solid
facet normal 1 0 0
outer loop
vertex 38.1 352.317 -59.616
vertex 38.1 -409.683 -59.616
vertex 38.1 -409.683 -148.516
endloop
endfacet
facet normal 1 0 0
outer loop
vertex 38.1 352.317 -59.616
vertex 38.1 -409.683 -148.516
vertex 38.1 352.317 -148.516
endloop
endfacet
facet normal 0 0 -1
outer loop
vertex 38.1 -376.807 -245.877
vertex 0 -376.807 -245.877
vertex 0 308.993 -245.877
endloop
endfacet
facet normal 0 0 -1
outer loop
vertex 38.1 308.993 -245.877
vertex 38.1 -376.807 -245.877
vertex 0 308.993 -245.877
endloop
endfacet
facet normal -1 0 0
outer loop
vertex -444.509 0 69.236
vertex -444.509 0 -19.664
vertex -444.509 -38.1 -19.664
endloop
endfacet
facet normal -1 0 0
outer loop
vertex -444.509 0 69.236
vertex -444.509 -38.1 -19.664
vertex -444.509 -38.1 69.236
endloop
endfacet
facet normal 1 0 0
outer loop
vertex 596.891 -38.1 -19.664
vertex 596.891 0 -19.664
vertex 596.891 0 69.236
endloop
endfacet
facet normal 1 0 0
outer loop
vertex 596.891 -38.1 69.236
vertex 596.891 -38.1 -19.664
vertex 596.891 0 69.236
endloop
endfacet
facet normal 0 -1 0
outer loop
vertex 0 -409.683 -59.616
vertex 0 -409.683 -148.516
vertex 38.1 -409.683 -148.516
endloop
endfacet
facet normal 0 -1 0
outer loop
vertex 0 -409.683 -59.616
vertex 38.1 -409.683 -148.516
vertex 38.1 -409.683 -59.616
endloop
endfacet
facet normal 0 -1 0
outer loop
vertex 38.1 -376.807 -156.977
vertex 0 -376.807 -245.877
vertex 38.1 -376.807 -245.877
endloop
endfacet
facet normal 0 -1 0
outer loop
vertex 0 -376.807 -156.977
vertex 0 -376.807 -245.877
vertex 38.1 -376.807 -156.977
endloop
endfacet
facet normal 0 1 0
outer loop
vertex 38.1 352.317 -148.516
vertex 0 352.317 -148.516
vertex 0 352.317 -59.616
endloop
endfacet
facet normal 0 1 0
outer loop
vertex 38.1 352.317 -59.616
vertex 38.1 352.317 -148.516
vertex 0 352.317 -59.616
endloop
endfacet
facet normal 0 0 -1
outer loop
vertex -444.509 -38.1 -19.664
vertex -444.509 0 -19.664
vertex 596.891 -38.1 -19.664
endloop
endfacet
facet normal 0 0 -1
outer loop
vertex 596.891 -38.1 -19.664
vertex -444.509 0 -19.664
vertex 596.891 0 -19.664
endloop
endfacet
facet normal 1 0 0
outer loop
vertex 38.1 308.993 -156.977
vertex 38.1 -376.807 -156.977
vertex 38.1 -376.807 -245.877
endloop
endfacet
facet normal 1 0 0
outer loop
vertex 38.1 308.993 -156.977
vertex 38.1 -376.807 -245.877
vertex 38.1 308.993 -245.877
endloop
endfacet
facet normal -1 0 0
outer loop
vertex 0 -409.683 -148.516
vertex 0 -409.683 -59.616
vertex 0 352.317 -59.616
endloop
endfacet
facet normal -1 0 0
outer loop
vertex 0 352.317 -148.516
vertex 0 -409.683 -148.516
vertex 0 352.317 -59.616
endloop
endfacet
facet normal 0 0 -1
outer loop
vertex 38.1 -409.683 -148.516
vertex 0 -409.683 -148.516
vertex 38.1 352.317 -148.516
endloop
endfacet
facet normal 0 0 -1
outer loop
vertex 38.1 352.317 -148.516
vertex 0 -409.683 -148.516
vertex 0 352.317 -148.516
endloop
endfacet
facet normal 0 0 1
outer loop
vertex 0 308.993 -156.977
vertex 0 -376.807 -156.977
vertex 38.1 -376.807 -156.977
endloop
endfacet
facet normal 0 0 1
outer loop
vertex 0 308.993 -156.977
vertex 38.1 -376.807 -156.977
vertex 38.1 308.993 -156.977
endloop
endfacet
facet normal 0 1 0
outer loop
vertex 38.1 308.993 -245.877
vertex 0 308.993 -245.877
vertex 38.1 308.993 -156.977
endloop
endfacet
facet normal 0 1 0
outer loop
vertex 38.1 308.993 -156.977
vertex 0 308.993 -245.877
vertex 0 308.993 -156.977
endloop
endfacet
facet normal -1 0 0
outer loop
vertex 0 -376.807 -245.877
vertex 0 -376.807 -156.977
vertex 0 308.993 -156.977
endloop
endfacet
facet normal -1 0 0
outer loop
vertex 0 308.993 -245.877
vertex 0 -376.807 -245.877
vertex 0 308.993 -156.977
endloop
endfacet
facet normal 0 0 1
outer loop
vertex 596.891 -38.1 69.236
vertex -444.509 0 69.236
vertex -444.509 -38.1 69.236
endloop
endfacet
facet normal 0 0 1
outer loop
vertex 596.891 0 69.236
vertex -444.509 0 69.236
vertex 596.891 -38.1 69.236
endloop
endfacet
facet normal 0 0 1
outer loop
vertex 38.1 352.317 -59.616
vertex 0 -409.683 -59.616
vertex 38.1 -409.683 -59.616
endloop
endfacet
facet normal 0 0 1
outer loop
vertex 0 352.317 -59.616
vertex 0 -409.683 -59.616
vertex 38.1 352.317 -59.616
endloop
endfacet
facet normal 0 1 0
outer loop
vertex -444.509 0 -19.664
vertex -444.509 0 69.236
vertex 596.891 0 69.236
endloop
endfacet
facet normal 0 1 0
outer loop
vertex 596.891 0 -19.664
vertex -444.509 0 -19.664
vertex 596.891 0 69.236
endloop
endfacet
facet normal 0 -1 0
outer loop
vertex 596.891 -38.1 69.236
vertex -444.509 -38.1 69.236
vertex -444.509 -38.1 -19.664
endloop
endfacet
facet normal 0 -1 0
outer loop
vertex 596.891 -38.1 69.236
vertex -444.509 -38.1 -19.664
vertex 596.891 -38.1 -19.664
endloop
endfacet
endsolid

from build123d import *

# Parameters (mm, degrees)
F0_W     = 1041.4
F0_H     = 88.9
F1_DEPTH = 38.1
F2_W     = 762
F2_H     = 88.9
F3_DEPTH = 38.1
F4_W     = 685.8
F4_H     = 88.9
F5_DEPTH = 38.1


with BuildPart() as f1:
    # F0 (on Front) → F1 (new body)
    with BuildSketch(Plane.XZ):
        with Locations((76.190971, 24.785625)):
            Rectangle(F0_W, F0_H)
    extrude(amount=F1_DEPTH)


with BuildPart() as f3:
    # F2 (on Right) → F3 (new body)
    with BuildSketch(Plane.YZ):
        with Locations((-28.683186, -104.066158)):
            Rectangle(F2_W, F2_H)
    extrude(amount=F3_DEPTH)


with BuildPart() as f5:
    # F4 (on Right) → F5 (new body)
    with BuildSketch(Plane.YZ):
        with Locations((-33.907279, -201.427261)):
            Rectangle(F4_W, F4_H)
    extrude(amount=F5_DEPTH)


solid = Compound([f1.part, f3.part, f5.part])
